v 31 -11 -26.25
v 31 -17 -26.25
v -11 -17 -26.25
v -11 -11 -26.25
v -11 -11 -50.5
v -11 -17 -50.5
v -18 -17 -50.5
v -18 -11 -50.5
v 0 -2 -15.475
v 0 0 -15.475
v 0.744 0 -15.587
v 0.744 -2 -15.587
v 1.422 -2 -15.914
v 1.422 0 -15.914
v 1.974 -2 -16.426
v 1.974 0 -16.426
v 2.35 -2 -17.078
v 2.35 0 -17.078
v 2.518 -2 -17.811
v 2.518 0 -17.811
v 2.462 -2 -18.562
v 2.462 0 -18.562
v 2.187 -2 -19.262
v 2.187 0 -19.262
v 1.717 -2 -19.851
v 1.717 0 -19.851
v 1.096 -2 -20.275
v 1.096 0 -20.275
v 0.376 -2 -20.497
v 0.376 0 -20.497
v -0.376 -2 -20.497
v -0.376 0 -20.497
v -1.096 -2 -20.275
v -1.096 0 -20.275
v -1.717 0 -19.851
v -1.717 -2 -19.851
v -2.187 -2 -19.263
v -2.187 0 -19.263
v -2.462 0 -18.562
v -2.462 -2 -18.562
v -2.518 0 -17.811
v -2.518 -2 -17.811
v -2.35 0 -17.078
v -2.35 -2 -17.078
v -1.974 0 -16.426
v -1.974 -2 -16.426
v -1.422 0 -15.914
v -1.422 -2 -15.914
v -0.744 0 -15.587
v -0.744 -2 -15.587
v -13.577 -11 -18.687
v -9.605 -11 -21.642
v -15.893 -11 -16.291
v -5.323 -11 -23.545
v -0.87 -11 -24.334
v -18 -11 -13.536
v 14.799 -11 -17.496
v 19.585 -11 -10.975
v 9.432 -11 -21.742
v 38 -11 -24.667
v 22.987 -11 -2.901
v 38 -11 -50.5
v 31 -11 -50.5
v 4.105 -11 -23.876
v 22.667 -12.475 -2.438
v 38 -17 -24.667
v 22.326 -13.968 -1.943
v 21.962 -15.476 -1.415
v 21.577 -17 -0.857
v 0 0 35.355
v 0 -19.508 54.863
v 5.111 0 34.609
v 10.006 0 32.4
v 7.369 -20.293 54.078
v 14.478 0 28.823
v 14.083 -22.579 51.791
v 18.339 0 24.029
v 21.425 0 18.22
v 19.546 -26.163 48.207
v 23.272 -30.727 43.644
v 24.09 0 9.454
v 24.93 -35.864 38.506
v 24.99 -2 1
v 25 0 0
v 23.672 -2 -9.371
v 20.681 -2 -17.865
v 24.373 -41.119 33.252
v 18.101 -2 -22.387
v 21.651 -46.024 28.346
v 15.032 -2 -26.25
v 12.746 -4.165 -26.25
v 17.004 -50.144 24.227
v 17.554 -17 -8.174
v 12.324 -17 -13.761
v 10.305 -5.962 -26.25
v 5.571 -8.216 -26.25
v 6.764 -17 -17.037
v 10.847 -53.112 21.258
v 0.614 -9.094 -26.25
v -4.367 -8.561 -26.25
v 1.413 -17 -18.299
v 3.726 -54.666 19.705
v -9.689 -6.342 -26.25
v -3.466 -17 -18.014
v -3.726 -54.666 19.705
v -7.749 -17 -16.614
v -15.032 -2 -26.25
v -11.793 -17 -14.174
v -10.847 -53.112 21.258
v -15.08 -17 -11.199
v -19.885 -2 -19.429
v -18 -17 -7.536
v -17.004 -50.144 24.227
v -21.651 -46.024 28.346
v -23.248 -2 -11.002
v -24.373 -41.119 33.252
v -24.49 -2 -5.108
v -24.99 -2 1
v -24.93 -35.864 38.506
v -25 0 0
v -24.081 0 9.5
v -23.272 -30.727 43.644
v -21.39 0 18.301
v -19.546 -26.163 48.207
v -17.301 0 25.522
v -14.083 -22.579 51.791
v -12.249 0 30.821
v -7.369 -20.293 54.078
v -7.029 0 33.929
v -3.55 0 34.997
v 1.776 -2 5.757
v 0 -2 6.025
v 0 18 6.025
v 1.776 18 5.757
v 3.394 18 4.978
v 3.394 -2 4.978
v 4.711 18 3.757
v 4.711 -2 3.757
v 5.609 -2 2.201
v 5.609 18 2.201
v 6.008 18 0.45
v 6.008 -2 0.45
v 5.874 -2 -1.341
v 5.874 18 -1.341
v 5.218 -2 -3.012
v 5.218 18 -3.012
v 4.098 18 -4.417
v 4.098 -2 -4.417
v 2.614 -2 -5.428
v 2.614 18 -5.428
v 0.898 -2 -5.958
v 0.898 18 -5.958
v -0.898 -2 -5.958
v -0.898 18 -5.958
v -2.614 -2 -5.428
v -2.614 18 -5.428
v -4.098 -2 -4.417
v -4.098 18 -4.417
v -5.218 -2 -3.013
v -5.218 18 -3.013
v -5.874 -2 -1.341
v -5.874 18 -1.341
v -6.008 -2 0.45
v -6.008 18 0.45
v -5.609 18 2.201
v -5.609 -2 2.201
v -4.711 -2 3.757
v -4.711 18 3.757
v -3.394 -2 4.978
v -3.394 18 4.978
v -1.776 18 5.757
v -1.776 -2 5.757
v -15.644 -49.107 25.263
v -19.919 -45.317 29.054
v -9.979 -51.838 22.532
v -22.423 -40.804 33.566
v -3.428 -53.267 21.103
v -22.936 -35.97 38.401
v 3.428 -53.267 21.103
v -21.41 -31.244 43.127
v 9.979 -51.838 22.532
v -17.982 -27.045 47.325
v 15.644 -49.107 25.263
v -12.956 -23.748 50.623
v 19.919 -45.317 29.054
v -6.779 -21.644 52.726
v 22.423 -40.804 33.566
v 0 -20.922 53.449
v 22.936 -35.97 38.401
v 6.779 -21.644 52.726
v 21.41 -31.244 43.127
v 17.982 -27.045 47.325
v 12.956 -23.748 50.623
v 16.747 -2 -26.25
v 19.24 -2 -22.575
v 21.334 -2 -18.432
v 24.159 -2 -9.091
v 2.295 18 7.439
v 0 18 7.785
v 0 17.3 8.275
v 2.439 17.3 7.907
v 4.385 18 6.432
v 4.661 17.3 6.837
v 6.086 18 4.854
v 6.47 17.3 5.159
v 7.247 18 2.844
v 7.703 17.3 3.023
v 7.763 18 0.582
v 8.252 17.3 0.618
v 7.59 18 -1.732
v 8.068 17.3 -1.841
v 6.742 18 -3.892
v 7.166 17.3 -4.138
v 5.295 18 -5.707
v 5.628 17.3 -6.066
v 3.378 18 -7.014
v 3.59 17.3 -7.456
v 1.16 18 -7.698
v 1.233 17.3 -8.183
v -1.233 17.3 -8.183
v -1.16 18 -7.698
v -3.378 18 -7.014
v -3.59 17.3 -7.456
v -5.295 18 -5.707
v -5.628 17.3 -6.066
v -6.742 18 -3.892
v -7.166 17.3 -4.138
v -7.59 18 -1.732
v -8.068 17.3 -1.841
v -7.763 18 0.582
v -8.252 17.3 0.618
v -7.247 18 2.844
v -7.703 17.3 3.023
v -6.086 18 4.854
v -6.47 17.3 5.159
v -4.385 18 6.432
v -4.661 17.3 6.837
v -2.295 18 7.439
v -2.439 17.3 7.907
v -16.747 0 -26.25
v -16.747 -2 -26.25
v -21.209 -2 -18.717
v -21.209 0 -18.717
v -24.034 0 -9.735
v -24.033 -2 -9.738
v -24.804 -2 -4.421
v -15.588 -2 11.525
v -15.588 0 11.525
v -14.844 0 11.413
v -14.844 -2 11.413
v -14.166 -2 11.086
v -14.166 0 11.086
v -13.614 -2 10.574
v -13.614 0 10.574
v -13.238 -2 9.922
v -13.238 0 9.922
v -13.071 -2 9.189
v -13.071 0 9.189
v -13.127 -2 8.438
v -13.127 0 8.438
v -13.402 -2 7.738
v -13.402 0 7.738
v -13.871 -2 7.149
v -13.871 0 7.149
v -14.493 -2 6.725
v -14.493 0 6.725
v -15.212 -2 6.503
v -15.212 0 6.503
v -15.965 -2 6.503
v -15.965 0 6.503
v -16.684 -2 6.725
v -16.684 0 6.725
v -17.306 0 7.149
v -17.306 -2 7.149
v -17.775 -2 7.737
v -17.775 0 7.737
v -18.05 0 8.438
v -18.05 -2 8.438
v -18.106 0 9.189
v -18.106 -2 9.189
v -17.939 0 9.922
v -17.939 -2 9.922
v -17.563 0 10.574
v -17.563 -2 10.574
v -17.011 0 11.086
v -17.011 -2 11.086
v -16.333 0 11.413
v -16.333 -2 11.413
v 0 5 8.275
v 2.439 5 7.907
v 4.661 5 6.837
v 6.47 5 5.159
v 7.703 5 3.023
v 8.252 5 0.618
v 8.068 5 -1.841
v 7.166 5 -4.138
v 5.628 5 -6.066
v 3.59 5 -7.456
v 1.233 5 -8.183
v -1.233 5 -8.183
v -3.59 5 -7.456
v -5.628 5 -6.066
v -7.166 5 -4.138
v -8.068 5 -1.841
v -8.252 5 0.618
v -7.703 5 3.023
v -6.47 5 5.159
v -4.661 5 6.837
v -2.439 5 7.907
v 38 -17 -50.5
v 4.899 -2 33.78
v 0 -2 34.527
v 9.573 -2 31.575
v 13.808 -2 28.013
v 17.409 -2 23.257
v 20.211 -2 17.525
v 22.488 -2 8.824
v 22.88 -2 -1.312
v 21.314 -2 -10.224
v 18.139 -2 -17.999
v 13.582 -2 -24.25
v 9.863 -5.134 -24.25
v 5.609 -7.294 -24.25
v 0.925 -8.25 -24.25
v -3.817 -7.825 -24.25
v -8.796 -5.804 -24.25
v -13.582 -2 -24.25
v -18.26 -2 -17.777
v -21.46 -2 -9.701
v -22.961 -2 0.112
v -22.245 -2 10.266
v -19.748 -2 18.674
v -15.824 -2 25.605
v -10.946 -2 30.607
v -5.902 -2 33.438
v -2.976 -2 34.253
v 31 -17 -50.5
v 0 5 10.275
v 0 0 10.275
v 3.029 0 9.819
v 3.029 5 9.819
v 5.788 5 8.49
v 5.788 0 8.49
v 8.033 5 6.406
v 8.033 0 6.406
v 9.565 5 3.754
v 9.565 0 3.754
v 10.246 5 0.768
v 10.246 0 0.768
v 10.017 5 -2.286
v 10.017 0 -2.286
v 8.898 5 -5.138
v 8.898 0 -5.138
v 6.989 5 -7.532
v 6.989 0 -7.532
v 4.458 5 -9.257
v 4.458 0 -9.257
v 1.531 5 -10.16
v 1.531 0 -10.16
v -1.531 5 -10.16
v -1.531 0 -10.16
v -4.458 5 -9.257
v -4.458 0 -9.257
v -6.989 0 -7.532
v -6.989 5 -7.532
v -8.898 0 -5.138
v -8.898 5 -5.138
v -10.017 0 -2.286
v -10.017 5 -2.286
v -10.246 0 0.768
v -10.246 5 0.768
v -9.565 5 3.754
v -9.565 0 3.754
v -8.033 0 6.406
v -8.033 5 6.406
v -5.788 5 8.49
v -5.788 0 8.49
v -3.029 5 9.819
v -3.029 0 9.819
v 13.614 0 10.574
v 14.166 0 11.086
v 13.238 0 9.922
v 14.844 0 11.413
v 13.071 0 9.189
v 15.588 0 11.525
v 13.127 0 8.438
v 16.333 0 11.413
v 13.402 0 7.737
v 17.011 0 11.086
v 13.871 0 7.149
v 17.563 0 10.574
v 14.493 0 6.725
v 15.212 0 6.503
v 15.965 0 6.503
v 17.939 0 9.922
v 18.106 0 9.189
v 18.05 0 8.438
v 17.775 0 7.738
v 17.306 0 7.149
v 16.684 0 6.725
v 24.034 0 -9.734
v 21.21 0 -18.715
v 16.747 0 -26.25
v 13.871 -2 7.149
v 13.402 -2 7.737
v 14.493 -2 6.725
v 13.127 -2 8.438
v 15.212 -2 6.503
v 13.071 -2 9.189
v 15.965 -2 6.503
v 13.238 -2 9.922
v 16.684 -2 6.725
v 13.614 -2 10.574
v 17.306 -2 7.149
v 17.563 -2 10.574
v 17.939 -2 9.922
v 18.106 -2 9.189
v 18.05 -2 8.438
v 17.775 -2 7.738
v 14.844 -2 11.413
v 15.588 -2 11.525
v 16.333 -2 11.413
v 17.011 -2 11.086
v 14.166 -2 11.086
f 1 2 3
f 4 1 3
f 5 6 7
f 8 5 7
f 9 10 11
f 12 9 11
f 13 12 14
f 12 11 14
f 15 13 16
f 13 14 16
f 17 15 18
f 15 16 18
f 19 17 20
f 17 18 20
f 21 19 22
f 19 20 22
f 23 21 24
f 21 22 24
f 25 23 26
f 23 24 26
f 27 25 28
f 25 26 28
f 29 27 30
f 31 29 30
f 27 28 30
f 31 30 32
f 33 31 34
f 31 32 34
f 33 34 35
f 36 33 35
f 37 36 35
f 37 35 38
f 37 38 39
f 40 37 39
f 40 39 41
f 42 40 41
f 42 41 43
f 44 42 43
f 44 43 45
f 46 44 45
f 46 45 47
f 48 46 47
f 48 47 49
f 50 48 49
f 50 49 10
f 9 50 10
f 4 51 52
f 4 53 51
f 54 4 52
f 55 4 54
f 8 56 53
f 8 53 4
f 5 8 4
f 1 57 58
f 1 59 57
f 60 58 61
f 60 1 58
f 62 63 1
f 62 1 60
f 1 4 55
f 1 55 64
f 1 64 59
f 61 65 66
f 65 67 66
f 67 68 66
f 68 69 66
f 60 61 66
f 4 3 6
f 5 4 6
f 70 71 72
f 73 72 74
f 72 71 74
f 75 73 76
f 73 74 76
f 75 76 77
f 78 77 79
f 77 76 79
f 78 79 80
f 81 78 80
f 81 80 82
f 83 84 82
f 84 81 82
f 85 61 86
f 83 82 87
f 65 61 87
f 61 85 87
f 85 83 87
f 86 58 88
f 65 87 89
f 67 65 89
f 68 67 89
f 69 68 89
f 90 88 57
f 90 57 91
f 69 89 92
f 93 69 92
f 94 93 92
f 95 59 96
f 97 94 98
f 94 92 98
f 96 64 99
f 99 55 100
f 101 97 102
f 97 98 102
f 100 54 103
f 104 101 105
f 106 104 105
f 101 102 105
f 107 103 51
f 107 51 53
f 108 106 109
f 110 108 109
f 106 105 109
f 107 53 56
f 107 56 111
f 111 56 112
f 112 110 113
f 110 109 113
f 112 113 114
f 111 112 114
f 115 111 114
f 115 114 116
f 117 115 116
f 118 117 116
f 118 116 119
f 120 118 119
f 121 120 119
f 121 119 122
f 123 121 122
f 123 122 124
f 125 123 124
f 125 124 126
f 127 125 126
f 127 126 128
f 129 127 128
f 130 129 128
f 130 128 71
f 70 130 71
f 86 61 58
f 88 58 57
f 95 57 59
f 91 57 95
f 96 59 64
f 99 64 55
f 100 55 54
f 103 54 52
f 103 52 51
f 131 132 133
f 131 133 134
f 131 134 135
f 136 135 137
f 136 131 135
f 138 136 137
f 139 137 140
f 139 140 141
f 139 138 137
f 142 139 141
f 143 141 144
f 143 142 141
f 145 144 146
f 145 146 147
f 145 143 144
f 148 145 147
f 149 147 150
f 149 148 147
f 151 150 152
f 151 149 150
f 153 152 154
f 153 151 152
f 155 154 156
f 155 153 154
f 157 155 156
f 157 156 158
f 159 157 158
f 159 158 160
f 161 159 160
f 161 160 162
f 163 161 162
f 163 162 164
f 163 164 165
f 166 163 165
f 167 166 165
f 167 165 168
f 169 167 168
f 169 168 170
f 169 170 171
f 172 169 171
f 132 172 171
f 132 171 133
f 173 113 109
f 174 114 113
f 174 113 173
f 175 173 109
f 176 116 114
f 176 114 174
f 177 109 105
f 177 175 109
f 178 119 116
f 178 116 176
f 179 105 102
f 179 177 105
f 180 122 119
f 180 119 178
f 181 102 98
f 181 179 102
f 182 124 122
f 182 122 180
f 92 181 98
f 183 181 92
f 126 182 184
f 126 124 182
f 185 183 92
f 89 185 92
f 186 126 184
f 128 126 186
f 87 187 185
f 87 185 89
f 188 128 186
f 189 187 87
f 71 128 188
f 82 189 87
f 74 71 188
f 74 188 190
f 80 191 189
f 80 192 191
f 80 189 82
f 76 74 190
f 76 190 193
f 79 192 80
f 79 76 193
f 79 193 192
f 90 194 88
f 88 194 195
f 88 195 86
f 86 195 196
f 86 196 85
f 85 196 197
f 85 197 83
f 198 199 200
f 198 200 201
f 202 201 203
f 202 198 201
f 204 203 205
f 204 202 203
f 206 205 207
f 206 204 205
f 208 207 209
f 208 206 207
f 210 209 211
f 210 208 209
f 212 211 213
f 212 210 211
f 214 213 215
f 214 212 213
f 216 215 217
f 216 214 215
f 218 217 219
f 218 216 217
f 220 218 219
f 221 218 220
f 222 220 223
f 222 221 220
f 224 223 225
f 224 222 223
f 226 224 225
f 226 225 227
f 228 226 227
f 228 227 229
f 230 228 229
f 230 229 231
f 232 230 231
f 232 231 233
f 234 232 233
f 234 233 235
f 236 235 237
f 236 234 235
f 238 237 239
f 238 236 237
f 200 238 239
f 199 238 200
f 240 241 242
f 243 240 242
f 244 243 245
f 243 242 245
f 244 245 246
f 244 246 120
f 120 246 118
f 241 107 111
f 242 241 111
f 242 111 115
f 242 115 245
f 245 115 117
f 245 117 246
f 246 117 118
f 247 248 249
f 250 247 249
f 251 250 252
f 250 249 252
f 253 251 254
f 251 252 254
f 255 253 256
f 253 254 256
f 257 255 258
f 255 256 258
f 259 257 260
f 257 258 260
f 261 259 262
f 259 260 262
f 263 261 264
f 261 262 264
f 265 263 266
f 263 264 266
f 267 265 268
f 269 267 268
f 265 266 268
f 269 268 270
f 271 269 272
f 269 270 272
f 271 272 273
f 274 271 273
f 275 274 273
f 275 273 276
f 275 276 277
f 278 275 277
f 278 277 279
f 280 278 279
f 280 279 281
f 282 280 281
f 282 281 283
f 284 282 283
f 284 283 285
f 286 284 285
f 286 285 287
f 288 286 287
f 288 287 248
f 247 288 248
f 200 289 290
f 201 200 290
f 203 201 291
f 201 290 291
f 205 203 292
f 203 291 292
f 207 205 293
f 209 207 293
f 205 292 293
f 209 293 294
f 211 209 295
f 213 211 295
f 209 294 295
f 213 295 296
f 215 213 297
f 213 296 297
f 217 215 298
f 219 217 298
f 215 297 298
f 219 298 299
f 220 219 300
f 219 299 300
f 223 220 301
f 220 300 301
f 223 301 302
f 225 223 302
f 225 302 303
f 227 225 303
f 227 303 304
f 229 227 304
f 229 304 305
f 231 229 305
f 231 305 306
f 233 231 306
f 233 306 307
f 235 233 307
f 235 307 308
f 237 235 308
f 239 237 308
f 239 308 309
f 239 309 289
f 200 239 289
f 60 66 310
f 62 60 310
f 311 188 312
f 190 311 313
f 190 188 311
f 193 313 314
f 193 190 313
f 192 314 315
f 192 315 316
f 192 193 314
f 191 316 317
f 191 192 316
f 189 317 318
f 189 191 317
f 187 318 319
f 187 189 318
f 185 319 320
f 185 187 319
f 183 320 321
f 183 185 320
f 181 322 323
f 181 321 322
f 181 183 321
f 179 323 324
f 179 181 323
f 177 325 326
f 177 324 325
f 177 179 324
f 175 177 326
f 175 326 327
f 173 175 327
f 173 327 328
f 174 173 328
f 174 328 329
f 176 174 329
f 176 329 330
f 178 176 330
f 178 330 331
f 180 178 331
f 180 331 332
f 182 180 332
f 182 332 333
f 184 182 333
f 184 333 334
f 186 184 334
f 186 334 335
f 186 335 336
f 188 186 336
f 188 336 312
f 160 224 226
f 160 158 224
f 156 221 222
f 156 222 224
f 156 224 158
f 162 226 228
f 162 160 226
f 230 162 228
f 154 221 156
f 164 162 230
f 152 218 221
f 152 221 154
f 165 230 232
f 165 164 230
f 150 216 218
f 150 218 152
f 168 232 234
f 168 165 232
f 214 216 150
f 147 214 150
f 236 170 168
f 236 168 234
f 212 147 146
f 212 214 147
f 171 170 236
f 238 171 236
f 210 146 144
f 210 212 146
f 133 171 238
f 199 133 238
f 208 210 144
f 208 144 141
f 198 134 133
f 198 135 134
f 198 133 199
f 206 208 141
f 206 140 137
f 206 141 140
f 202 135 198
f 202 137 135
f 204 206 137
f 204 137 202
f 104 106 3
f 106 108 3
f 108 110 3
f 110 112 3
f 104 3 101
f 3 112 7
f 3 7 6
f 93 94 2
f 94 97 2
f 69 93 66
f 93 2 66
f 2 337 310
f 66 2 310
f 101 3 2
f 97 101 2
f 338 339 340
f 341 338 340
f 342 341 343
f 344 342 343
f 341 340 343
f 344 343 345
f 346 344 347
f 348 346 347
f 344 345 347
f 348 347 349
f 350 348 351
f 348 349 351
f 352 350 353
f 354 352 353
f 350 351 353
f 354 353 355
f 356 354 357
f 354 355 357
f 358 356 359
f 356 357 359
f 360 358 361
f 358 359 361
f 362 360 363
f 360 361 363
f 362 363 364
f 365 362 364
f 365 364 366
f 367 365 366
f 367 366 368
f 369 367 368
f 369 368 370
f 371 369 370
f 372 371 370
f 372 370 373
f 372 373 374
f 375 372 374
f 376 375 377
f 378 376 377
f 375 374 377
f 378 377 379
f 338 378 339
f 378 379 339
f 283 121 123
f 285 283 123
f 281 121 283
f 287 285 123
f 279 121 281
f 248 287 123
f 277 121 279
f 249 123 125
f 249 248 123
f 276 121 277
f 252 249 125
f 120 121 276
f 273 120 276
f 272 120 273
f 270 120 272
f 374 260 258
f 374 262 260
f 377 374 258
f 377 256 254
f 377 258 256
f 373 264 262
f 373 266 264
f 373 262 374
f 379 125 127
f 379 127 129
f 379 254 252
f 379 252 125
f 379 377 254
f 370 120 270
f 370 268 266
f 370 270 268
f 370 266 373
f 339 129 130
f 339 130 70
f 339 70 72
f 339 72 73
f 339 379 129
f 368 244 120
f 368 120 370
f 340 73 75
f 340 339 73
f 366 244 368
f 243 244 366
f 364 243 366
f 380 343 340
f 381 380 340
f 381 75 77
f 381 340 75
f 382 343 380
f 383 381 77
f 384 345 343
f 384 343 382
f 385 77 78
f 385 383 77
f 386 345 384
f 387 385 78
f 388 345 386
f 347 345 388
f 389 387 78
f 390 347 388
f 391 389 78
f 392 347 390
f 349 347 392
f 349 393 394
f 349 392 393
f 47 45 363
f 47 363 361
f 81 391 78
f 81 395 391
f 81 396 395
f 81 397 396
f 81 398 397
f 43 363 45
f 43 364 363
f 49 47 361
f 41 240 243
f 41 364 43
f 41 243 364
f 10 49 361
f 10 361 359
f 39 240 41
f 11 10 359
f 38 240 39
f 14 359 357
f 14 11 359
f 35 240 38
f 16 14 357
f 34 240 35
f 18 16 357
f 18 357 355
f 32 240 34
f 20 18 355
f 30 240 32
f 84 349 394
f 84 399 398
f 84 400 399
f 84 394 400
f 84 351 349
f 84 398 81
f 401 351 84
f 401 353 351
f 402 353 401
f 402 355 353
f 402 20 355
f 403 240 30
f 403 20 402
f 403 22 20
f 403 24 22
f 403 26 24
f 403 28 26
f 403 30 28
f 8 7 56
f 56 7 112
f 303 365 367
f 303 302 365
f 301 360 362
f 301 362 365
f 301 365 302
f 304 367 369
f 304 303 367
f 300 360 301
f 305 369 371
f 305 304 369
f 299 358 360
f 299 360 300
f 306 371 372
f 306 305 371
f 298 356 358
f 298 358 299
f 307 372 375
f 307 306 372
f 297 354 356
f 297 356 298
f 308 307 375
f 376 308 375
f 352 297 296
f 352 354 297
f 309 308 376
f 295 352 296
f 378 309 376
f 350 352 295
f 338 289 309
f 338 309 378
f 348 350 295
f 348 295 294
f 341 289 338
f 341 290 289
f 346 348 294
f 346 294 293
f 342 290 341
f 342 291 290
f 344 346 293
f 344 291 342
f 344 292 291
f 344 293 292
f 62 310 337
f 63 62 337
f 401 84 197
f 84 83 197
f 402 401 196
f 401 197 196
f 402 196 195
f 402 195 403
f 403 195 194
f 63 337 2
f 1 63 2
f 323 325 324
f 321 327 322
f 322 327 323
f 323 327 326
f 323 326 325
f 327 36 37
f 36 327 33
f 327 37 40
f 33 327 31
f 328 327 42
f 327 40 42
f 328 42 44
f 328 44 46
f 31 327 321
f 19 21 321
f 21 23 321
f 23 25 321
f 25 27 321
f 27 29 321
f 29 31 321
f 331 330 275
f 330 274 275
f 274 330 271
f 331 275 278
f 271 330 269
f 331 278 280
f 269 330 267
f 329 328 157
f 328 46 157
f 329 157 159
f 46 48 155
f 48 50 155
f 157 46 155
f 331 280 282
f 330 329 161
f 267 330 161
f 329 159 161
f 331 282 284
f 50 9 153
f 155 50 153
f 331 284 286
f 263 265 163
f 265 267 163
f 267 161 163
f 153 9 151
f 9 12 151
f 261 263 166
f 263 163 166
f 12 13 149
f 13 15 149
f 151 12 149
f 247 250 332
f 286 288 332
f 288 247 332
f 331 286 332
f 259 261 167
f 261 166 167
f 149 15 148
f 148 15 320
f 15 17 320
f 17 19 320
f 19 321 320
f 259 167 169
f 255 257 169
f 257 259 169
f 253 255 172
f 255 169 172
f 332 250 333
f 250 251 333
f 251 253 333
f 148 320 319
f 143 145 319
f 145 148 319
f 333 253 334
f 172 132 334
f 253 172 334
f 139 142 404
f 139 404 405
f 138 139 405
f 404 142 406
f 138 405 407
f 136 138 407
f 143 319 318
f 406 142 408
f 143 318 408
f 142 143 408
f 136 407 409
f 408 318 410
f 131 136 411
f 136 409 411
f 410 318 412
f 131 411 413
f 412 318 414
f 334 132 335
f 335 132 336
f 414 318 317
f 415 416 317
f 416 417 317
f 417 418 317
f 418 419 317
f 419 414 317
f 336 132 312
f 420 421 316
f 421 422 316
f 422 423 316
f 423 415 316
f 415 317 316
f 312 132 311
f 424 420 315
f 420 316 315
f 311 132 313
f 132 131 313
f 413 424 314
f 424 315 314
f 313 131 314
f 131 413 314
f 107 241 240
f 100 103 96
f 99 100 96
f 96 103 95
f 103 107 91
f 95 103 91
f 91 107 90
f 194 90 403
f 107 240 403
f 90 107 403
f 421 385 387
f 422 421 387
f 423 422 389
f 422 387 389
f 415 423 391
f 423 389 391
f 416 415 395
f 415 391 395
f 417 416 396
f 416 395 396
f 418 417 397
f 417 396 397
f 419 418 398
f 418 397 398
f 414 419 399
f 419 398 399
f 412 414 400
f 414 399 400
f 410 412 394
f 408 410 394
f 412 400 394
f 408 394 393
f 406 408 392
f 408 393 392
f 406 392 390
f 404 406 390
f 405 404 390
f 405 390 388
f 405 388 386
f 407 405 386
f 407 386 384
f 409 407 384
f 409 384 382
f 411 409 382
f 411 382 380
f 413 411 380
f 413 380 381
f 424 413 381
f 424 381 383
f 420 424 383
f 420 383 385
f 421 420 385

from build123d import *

# Parameters (mm, degrees)
SKETCH1_R                 = 10.275
SKETCH1_R_2               = 8.275
BOSS_EXTRUDE3_DEPTH       = 5
SKETCH1_6_R               = 8.275
SKETCH1_6_R_2             = 6.025
BOSS_EXTRUDE4_DEPTH       = 18
BOSS_EXTRUDE7_DEPTH       = 40
BOSS_EXTRUDE7_DEPTH_BACK  = 70
SKETCH4_R                 = 25
SKETCH4_R_2               = 23
SKETCH7_W                 = 197.712308018
SKETCH7_H                 = 113.854833504
CUT_EXTRUDE4_DEPTH        = 64
BOSS_EXTRUDE9_START       = -2
SKETCH9_RX                = 35.355339059
SKETCH9_RY                = 25
SKETCH9_R                 = 6.025
BOSS_EXTRUDE9_DEPTH       = 2
BOSS_EXTRUDE12_DEPTH      = 2
BOSS_EXTRUDE12_DEPTH_BACK = 4
SKETCH22_W                = 69.752550136
SKETCH22_H                = 19.780641822
CUT_EXTRUDE5_DEPTH        = 10
BOSS_EXTRUDE13_START      = -2
BOSS_EXTRUDE13_DEPTH      = 2
CUT_EXTRUDE6_REACH        = 111.4
SKETCH21_R                = 2.525
CUT_EXTRUDE14_START       = -80
CUT_EXTRUDE14_DEPTH       = 80
CUT_EXTRUDE21_START       = -86
CUT_EXTRUDE21_DEPTH       = 86
SKETCH28_R                = 28.746438964
CUT_EXTRUDE22_DEPTH       = 25
CHAMFER1_SIZE             = 0.7
CHAMFER1_SIZE2            = 0.490145277


with BuildPart() as part:
    # Sketch1 → Boss-Extrude3 (new body)
    with BuildSketch(Plane(origin=(0, 0, 0), x_dir=(1, 0, 0), z_dir=(0, 1, 0))):
        with Locations(Location((0, 0, 0), (0, 0, 270))):
            Circle(SKETCH1_R)
        with Locations(Location((0, 0, 0), (0, 0, 270))):
            Circle(SKETCH1_R_2, mode=Mode.SUBTRACT)
    extrude(amount=BOSS_EXTRUDE3_DEPTH)

    # Sketch1<6> → Boss-Extrude4 (add)
    with BuildSketch(Plane(origin=(0, 0, 0), x_dir=(1, 0, 0), z_dir=(0, 1, 0))):
        with Locations(Location((0, 0, 0), (0, 0, 270))):
            Circle(SKETCH1_6_R)
        with Locations(Location((0, 0, 0), (0, 0, 270))):
            Circle(SKETCH1_6_R_2, mode=Mode.SUBTRACT)
    extrude(amount=BOSS_EXTRUDE4_DEPTH)



with BuildPart() as body_2:
    # Sketch4 → Boss-Extrude7 (new, two sides: drawn at the far end of the back side and taken through both)
    with BuildSketch(Plane(origin=(0, -5.365491749, 5.365491749), x_dir=(-1, 0, 0), z_dir=(0, 0.7071067811865458, -0.7071067811865492)).offset(-BOSS_EXTRUDE7_DEPTH_BACK)):
        with Locations(Location((0, 0, 0), (0, 0, 90))):
            Circle(SKETCH4_R)
        with Locations(Location((0, 0, 0), (0, 0, 90))):
            Circle(SKETCH4_R_2, mode=Mode.SUBTRACT)
    extrude(amount=BOSS_EXTRUDE7_DEPTH + BOSS_EXTRUDE7_DEPTH_BACK)

    # Sketch7 → Cut-Extrude4 (cut)
    with BuildSketch(Plane(origin=(0, 0, 0), x_dir=(1, 0, 0), z_dir=(0, 1, 0))):
        Rectangle(SKETCH7_W, SKETCH7_H)
    extrude(amount=CUT_EXTRUDE4_DEPTH, mode=Mode.SUBTRACT)


with BuildPart() as part_1:
    add(part.part)

    add(body_2.part)  # Boss-Extrude9 merges body 2
    # Sketch9 → Boss-Extrude9 (add)
    with BuildSketch(Plane(origin=(0, 0, 0), x_dir=(1, 0, 0), z_dir=(0, 1, 0)).offset(BOSS_EXTRUDE9_START)):
        with Locations(Location((0, 0), (0, 0, -90))):
            Ellipse(SKETCH9_RX, SKETCH9_RY)
        with Locations(Location((0, 0, 0), (0, 0, 270))):
            Circle(SKETCH9_R, mode=Mode.SUBTRACT)
    extrude(amount=BOSS_EXTRUDE9_DEPTH)

    # Sketch15 → Boss-Extrude12 (add, two sides: drawn at the far end of the back side and taken through both)
    with BuildSketch(Plane(origin=(0, -13, 0), x_dir=(1, 0, 0), z_dir=(0, 1, 0)).offset(-BOSS_EXTRUDE12_DEPTH_BACK)):
        Polygon((-18, 50.5), (-18, 5.077623205), (-11, 12.425207431), (0.436295729, 16.20866498), (9.681434559, 13.33514052), (16.664877802, 7.136081647), (20.985766733, 0), (38, 24.667240496), (38, 50.5), (31, 50.5), (31, 26.250403727), (-11, 26.250403727), (-11, 50.5), align=None)
    extrude(amount=BOSS_EXTRUDE12_DEPTH + BOSS_EXTRUDE12_DEPTH_BACK)

    # Sketch22 → Cut-Extrude5 (cut)
    with BuildSketch(Plane.XY.offset(-26.250403727)):
        Rectangle(SKETCH22_W, SKETCH22_H)
    extrude(amount=-CUT_EXTRUDE5_DEPTH, mode=Mode.SUBTRACT)

    # Boss-Extrude13: read off the stored shape, not the designer's step
    # Boss-Extrude13 outline → Boss-Extrude13 (add)
    with BuildSketch(Plane(origin=(0, 0, -26.250403727), x_dir=(-1, 0, 0), z_dir=(0, 0, -1)).offset(BOSS_EXTRUDE13_START)):
        with BuildLine():
            add(Edge.make_bspline(
                [(13.581537177, -2), (0, -16.053738297), (-13.581537177, -2)],
                knots=[2.5099124, 2.5099124, 2.5099124, 3.773272907, 3.773272907, 3.773272907], degree=2, weights=[1, 0.807036456, 1]))
            Line((13.581537177, -2), (-13.581537177, -2))
        make_face()
    extrude(amount=BOSS_EXTRUDE13_DEPTH)

    # Sketch21 → Cut-Extrude6 (cut, up to next)
    with BuildSketch(Plane(origin=(0, 0, 0), x_dir=(1, 0, 0), z_dir=(0, 1, 0)), mode=Mode.PRIVATE) as cut_extrude6_sk1:
        with Locations(Location((0, 18, 0), (0, 0, 270))):
            Circle(SKETCH21_R)
    cut_extrude6_tool1 = extrude(cut_extrude6_sk1.sketch, amount=-CUT_EXTRUDE6_REACH, mode=Mode.PRIVATE) & part_1.part
    # Sketch21 → Cut-Extrude6 (cut, up to next)
    with BuildSketch(Plane(origin=(0, 0, 0), x_dir=(1, 0, 0), z_dir=(0, 1, 0)), mode=Mode.PRIVATE) as cut_extrude6_sk2:
        with Locations(Location((15.588457268, -9, 0), (0, 0, 270))):
            Circle(SKETCH21_R)
    cut_extrude6_tool2 = extrude(cut_extrude6_sk2.sketch, amount=-CUT_EXTRUDE6_REACH, mode=Mode.PRIVATE) & part_1.part
    # Sketch21 → Cut-Extrude6 (cut, up to next)
    with BuildSketch(Plane(origin=(0, 0, 0), x_dir=(1, 0, 0), z_dir=(0, 1, 0)), mode=Mode.PRIVATE) as cut_extrude6_sk3:
        with Locations(Location((-15.588457268, -9, 0), (0, 0, 270))):
            Circle(SKETCH21_R)
    cut_extrude6_tool3 = extrude(cut_extrude6_sk3.sketch, amount=-CUT_EXTRUDE6_REACH, mode=Mode.PRIVATE) & part_1.part
    add(cut_extrude6_tool1.solids().sort_by_distance((0, 0, -18))[0], mode=Mode.SUBTRACT)
    add(cut_extrude6_tool2.solids().sort_by_distance((15.588457, 0, 9))[0], mode=Mode.SUBTRACT)
    add(cut_extrude6_tool3.solids().sort_by_distance((-15.588457, 0, 9))[0], mode=Mode.SUBTRACT)

    # Sketch25 → Cut-Extrude14 (cut)
    with BuildSketch(Plane(origin=(0, -54.862966432, 54.862966432), x_dir=(1, 0, 0), z_dir=(0, -0.7071067811865458, 0.7071067811865492)).offset(CUT_EXTRUDE14_START)):
        with BuildLine():
            Line((-18.997239916, -12.965526429), (-18.318994403, -10.280413374))
            Line((-18.318994403, -10.280413374), (-10.404229656, -15.136075873))
            Line((-10.404229656, -15.136075873), (-2.155134235, -17.219754227))
            Line((-2.155134235, -17.219754227), (4.378324516, -17.219754227))
            Line((4.378324516, -17.219754227), (10.005758959, -15.720266669))
            Line((10.005758959, -15.720266669), (15.570666352, -12.156224855))
            Line((15.570666352, -12.156224855), (20.908140469, -7.71958569))
            Line((20.908140469, -7.71958569), (21.57633395, -7.966292318))
            ThreePointArc((21.57633395, -7.966292318), (2.812653006, -22.827373547), (-18.997239916, -12.965526429))
        make_face()
    extrude(amount=CUT_EXTRUDE14_DEPTH, mode=Mode.SUBTRACT)

    # Sketch27 → Cut-Extrude21 (cut)
    with BuildSketch(Plane(origin=(0, -54.862966432, 54.862966432), x_dir=(1, 0, 0), z_dir=(0, -0.7071067811865458, 0.7071067811865492)).offset(CUT_EXTRUDE21_START)):
        with BuildLine():
            Line((-14.900346348, -17.520835559), (14.900346348, -17.520835559))
            ThreePointArc((14.900346348, -17.520835559), (0, -23), (-14.900346348, -17.520835559))
        make_face()
    extrude(amount=CUT_EXTRUDE21_DEPTH, mode=Mode.SUBTRACT)

    # Sketch28 → Cut-Extrude22 (cut)
    with BuildSketch(Plane(origin=(0, -54.862966432, 54.862966432), x_dir=(1, 0, 0), z_dir=(0, -0.7071067811865458, 0.7071067811865492))):
        Circle(SKETCH28_R)
    extrude(amount=-CUT_EXTRUDE22_DEPTH, mode=Mode.SUBTRACT)

    # Chamfer1
    chamfer1_edges = [part_1.edges().sort_by_distance(p)[0] for p in [
        (0, 18, -8.275),
    ]]
    chamfer1_side = [part_1.faces().sort_by_distance(p)[0] for p in [
        (0, 11.5, -8.275),
    ]]
    chamfer(chamfer1_edges, length=CHAMFER1_SIZE, length2=CHAMFER1_SIZE2, reference=chamfer1_side[0])


solid = part_1.part
